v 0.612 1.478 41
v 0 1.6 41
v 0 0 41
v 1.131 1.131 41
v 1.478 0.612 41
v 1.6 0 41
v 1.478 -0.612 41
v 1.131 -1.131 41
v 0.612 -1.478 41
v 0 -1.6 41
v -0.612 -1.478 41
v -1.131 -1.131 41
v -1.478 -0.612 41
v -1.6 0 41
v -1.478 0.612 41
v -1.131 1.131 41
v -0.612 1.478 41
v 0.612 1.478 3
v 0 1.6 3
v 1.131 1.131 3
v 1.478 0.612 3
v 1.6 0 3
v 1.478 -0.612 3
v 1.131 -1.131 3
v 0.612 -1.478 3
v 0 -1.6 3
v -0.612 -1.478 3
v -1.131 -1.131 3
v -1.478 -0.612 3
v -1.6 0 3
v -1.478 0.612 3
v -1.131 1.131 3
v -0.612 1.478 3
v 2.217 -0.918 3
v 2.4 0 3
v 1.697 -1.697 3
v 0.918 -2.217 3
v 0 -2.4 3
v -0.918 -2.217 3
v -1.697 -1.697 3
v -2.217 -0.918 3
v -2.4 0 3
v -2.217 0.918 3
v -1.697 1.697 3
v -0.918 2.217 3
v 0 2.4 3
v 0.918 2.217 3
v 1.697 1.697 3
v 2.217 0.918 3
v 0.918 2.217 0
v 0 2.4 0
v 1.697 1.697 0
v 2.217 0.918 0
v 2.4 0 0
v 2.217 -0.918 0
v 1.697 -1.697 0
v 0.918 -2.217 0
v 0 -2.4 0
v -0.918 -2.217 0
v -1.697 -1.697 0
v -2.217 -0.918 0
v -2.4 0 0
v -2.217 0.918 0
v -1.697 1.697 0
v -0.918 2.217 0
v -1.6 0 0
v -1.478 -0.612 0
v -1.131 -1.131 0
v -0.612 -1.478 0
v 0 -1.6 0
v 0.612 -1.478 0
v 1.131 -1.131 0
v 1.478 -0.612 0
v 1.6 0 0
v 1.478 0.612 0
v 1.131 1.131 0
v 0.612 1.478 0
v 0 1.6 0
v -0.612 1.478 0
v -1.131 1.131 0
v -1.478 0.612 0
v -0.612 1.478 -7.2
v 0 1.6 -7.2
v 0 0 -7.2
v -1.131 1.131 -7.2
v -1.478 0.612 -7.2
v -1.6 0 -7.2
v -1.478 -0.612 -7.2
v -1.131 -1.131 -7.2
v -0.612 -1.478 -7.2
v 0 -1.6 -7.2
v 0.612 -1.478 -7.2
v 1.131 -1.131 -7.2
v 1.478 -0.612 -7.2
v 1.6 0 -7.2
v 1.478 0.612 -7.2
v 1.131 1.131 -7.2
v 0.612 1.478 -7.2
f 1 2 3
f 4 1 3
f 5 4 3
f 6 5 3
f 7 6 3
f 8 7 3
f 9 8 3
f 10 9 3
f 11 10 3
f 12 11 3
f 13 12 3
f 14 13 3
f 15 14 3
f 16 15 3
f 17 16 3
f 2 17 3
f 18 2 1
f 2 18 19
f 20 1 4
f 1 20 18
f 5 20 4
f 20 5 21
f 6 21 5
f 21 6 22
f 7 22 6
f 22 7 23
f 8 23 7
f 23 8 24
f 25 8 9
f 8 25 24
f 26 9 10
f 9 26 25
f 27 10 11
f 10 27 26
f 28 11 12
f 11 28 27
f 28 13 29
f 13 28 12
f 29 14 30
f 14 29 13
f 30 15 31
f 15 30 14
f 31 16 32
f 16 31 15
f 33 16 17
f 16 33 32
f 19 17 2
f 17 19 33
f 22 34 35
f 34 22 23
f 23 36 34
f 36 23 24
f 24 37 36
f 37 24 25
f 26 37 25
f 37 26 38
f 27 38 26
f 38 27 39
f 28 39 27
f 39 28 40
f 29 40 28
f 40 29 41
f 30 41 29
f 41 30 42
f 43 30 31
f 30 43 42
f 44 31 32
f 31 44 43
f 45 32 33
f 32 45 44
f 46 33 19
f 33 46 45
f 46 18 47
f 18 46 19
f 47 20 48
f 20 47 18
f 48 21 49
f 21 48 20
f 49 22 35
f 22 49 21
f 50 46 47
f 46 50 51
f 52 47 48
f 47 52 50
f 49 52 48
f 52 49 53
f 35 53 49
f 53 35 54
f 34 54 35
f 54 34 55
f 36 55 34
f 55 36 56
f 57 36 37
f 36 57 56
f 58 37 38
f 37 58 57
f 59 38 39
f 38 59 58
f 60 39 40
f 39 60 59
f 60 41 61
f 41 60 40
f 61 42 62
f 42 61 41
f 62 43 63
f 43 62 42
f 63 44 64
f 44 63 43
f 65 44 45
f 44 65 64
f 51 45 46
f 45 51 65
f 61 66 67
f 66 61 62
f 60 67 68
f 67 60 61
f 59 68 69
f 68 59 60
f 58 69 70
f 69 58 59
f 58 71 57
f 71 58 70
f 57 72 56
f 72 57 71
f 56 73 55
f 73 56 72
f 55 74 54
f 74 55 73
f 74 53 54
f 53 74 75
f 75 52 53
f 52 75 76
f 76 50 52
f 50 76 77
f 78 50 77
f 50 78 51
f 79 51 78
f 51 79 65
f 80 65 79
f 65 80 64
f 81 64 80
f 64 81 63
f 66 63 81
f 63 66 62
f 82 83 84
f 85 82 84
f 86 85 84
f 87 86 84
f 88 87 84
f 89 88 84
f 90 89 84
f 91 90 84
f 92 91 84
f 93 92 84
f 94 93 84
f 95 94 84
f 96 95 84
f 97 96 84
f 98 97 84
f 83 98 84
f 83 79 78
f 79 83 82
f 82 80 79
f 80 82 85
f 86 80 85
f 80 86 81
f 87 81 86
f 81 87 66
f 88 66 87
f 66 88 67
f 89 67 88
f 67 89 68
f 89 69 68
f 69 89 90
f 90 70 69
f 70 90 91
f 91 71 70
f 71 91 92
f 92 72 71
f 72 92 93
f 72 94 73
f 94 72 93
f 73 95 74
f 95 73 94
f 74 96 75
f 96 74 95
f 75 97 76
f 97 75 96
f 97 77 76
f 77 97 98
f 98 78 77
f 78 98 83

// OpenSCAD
// file: ../p/4-4disc.scad
use <../lib.scad>
function ldraw_lib__4_4disc() = [
// 0 Disc 1.0
// 0 Name: 4-4disc.dat
// 0 Author: James Jessiman
// 0 !LDRAW_ORG Primitive UPDATE 2002-02
// 0 !LICENSE Licensed under CC BY 4.0 : see CAreadme.txt
// 
// 0 BFC CERTIFY CCW
  [0,"BFC","CERTIFY"],
  [0,"BFC","CCW"],
// 
// 0 !HISTORY 1998-12-15 [PTadmin] Official Update 1998-10
// 0 !HISTORY 2002-03-23 [sbliss] Added BFC statement
// 0 !HISTORY 2002-04-25 [PTadmin] Official Update 2002-02
// 0 !HISTORY 2007-06-24 [PTadmin] Header formatted for Contributor Agreement
// 0 !HISTORY 2008-07-01 [PTadmin] Official Update 2008-01
// 
// 
// 3 16 0 0 0 1 0 0 0.9239 0 0.3827
  [3,16,0,0,0,1,0,0,0.9239,0,0.3827],
// 3 16 0 0 0 0.9239 0 0.3827 0.7071 0 0.7071
  [3,16,0,0,0,0.9239,0,0.3827,0.7071,0,0.7071],
// 3 16 0 0 0 0.7071 0 0.7071 0.3827 0 0.9239
  [3,16,0,0,0,0.7071,0,0.7071,0.3827,0,0.9239],
// 3 16 0 0 0 0.3827 0 0.9239 0 0 1
  [3,16,0,0,0,0.3827,0,0.9239,0,0,1],
// 3 16 0 0 0 0 0 1 -0.3827 0 0.9239
  [3,16,0,0,0,0,0,1,-0.3827,0,0.9239],
// 3 16 0 0 0 -0.3827 0 0.9239 -0.7071 0 0.7071
  [3,16,0,0,0,-0.3827,0,0.9239,-0.7071,0,0.7071],
// 3 16 0 0 0 -0.7071 0 0.7071 -0.9239 0 0.3827
  [3,16,0,0,0,-0.7071,0,0.7071,-0.9239,0,0.3827],
// 3 16 0 0 0 -0.9239 0 0.3827 -1 0 -0
  [3,16,0,0,0,-0.9239,0,0.3827,-1,0,-0],
// 3 16 0 0 0 -1 0 -0 -0.9239 0 -0.3827
  [3,16,0,0,0,-1,0,-0,-0.9239,0,-0.3827],
// 3 16 0 0 0 -0.9239 0 -0.3827 -0.7071 0 -0.7071
  [3,16,0,0,0,-0.9239,0,-0.3827,-0.7071,0,-0.7071],
// 3 16 0 0 0 -0.7071 0 -0.7071 -0.3827 0 -0.9239
  [3,16,0,0,0,-0.7071,0,-0.7071,-0.3827,0,-0.9239],
// 3 16 0 0 0 -0.3827 0 -0.9239 0 0 -1
  [3,16,0,0,0,-0.3827,0,-0.9239,0,0,-1],
// 3 16 0 0 0 0 0 -1 0.3827 0 -0.9239
  [3,16,0,0,0,0,0,-1,0.3827,0,-0.9239],
// 3 16 0 0 0 0.3827 0 -0.9239 0.7071 0 -0.7071
  [3,16,0,0,0,0.3827,0,-0.9239,0.7071,0,-0.7071],
// 3 16 0 0 0 0.7071 0 -0.7071 0.9239 0 -0.3827
  [3,16,0,0,0,0.7071,0,-0.7071,0.9239,0,-0.3827],
// 3 16 0 0 0 0.9239 0 -0.3827 1 0 0
  [3,16,0,0,0,0.9239,0,-0.3827,1,0,0],
// 0
];
module ldraw_lib__4_4disc(step=0, col=false, unit=2/5, alt=false, line=0.2, solid=!$preview)
    makepoly(ldraw_lib__4_4disc(), step=step, col=col, unit=unit, alt=alt, line=line, solid=solid);
ldraw_lib__4_4disc(line=0.2);
// file: ../p/4-4ring2.scad
use <../lib.scad>
function ldraw_lib__4_4ring2() = [
// 0 Ring  2 x 1.0
// 0 Name: 4-4ring2.dat
// 0 Author: James Jessiman
// 0 !LDRAW_ORG Primitive UPDATE 2009-01
// 0 !LICENSE Licensed under CC BY 4.0 : see CAreadme.txt
// 
// 0 BFC CERTIFY CCW
  [0,"BFC","CERTIFY"],
  [0,"BFC","CCW"],
// 
// 0 !HISTORY 1998-12-15 [PTadmin] Official Update 1998-10
// 0 !HISTORY 2002-04-05 [hafhead] Added BFC statement
// 0 !HISTORY 2002-04-25 [PTadmin] Official Update 2002-02
// 0 !HISTORY 2007-06-24 [PTadmin] Header formatted for Contributor Agreement
// 0 !HISTORY 2008-07-01 [PTadmin] Official Update 2008-01
// 0 !HISTORY 2008-08-26 [cwdee] Switch polygon winding and rename
// 0 !HISTORY 2009-05-02 [PTadmin] Official Update 2009-01
// 
// 
// 4 16 -1.1481 0 2.7717 -0.7654 0 1.8478 0 0 2 0 0 3
  [4,16,-1.1481,0,2.7717,-0.7654,0,1.8478,0,0,2,0,0,3],
// 4 16 -2.1213 0 2.1213 -1.4142 0 1.4142 -0.7654 0 1.8478 -1.1481 0 2.7717
  [4,16,-2.1213,0,2.1213,-1.4142,0,1.4142,-0.7654,0,1.8478,-1.1481,0,2.7717],
// 4 16 -2.7717 0 1.1481 -1.8478 0 0.7654 -1.4142 0 1.4142 -2.1213 0 2.1213
  [4,16,-2.7717,0,1.1481,-1.8478,0,0.7654,-1.4142,0,1.4142,-2.1213,0,2.1213],
// 4 16 -3 0 0 -2 0 0 -1.8478 0 0.7654 -2.7717 0 1.1481
  [4,16,-3,0,0,-2,0,0,-1.8478,0,0.7654,-2.7717,0,1.1481],
// 4 16 -2.7717 0 -1.1481 -1.8478 0 -0.7654 -2 0 0 -3 0 0
  [4,16,-2.7717,0,-1.1481,-1.8478,0,-0.7654,-2,0,0,-3,0,0],
// 4 16 -2.1213 0 -2.1213 -1.4142 0 -1.4142 -1.8478 0 -0.7654 -2.7717 0 -1.1481
  [4,16,-2.1213,0,-2.1213,-1.4142,0,-1.4142,-1.8478,0,-0.7654,-2.7717,0,-1.1481],
// 4 16 -1.1481 0 -2.7717 -0.7654 0 -1.8478 -1.4142 0 -1.4142 -2.1213 0 -2.1213
  [4,16,-1.1481,0,-2.7717,-0.7654,0,-1.8478,-1.4142,0,-1.4142,-2.1213,0,-2.1213],
// 4 16 0 0 -3 0 0 -2 -0.7654 0 -1.8478 -1.1481 0 -2.7717
  [4,16,0,0,-3,0,0,-2,-0.7654,0,-1.8478,-1.1481,0,-2.7717],
// 4 16 1.1481 0 -2.7717 0.7654 0 -1.8478 0 0 -2 0 0 -3
  [4,16,1.1481,0,-2.7717,0.7654,0,-1.8478,0,0,-2,0,0,-3],
// 4 16 2.1213 0 -2.1213 1.4142 0 -1.4142 0.7654 0 -1.8478 1.1481 0 -2.7717
  [4,16,2.1213,0,-2.1213,1.4142,0,-1.4142,0.7654,0,-1.8478,1.1481,0,-2.7717],
// 4 16 2.7717 0 -1.1481 1.8478 0 -0.7654 1.4142 0 -1.4142 2.1213 0 -2.1213
  [4,16,2.7717,0,-1.1481,1.8478,0,-0.7654,1.4142,0,-1.4142,2.1213,0,-2.1213],
// 4 16 3 0 0 2 0 0 1.8478 0 -0.7654 2.7717 0 -1.1481
  [4,16,3,0,0,2,0,0,1.8478,0,-0.7654,2.7717,0,-1.1481],
// 4 16 2.7717 0 1.1481 1.8478 0 0.7654 2 0 0 3 0 0
  [4,16,2.7717,0,1.1481,1.8478,0,0.7654,2,0,0,3,0,0],
// 4 16 2.1213 0 2.1213 1.4142 0 1.4142 1.8478 0 0.7654 2.7717 0 1.1481
  [4,16,2.1213,0,2.1213,1.4142,0,1.4142,1.8478,0,0.7654,2.7717,0,1.1481],
// 4 16 1.1481 0 2.7717 0.7654 0 1.8478 1.4142 0 1.4142 2.1213 0 2.1213
  [4,16,1.1481,0,2.7717,0.7654,0,1.8478,1.4142,0,1.4142,2.1213,0,2.1213],
// 4 16 0 0 3 0 0 2 0.7654 0 1.8478 1.1481 0 2.7717
  [4,16,0,0,3,0,0,2,0.7654,0,1.8478,1.1481,0,2.7717],
// 0
];
module ldraw_lib__4_4ring2(step=0, col=false, unit=2/5, alt=false, line=0.2, solid=!$preview)
    makepoly(ldraw_lib__4_4ring2(), step=step, col=col, unit=unit, alt=alt, line=line, solid=solid);
ldraw_lib__4_4ring2(line=0.2);
// file: ../p/4-4edge.scad
use <../lib.scad>
function ldraw_lib__4_4edge() = [
// 0 Circle 1.0
// 0 Name: 4-4edge.dat
// 0 Author: James Jessiman
// 0 !LDRAW_ORG Primitive UPDATE 2017-01
// 0 !LICENSE Licensed under CC BY 4.0 : see CAreadme.txt
// 
// 0 BFC CERTIFY CCW
  [0,"BFC","CERTIFY"],
  [0,"BFC","CCW"],
// 
// 0 !HISTORY 1998-12-15 [PTadmin] Official Update 1998-10
// 0 !HISTORY 2005-12-28 [PTadmin] Official Update 2005-01
// 0 !HISTORY 2007-06-24 [PTadmin] Header formatted for Contributor Agreement
// 0 !HISTORY 2008-07-01 [PTadmin] Official Update 2008-01
// 0 !HISTORY 2017-01-15 [Steffen] BFCed
// 0 !HISTORY 2017-12-30 [PTadmin] Official Update 2017-01
// 
// 
// 2 24 1 0 0 0.9239 0 0.3827
  [2,24,1,0,0,0.9239,0,0.3827],
// 2 24 0.9239 0 0.3827 0.7071 0 0.7071
  [2,24,0.9239,0,0.3827,0.7071,0,0.7071],
// 2 24 0.7071 0 0.7071 0.3827 0 0.9239
  [2,24,0.7071,0,0.7071,0.3827,0,0.9239],
// 2 24 0.3827 0 0.9239 0 0 1
  [2,24,0.3827,0,0.9239,0,0,1],
// 2 24 0 0 1 -0.3827 0 0.9239
  [2,24,0,0,1,-0.3827,0,0.9239],
// 2 24 -0.3827 0 0.9239 -0.7071 0 0.7071
  [2,24,-0.3827,0,0.9239,-0.7071,0,0.7071],
// 2 24 -0.7071 0 0.7071 -0.9239 0 0.3827
  [2,24,-0.7071,0,0.7071,-0.9239,0,0.3827],
// 2 24 -0.9239 0 0.3827 -1 0 -0
  [2,24,-0.9239,0,0.3827,-1,0,-0],
// 2 24 -1 0 -0 -0.9239 0 -0.3827
  [2,24,-1,0,-0,-0.9239,0,-0.3827],
// 2 24 -0.9239 0 -0.3827 -0.7071 0 -0.7071
  [2,24,-0.9239,0,-0.3827,-0.7071,0,-0.7071],
// 2 24 -0.7071 0 -0.7071 -0.3827 0 -0.9239
  [2,24,-0.7071,0,-0.7071,-0.3827,0,-0.9239],
// 2 24 -0.3827 0 -0.9239 0 0 -1
  [2,24,-0.3827,0,-0.9239,0,0,-1],
// 2 24 0 0 -1 0.3827 0 -0.9239
  [2,24,0,0,-1,0.3827,0,-0.9239],
// 2 24 0.3827 0 -0.9239 0.7071 0 -0.7071
  [2,24,0.3827,0,-0.9239,0.7071,0,-0.7071],
// 2 24 0.7071 0 -0.7071 0.9239 0 -0.3827
  [2,24,0.7071,0,-0.7071,0.9239,0,-0.3827],
// 2 24 0.9239 0 -0.3827 1 0 0
  [2,24,0.9239,0,-0.3827,1,0,0],
];
module ldraw_lib__4_4edge(step=0, col=false, unit=2/5, alt=false, line=0.2, solid=!$preview)
    makepoly(ldraw_lib__4_4edge(), step=step, col=col, unit=unit, alt=alt, line=line, solid=solid);
ldraw_lib__4_4edge(line=0.2);
// file: ../p/4-4cyli.scad
use <../lib.scad>
function ldraw_lib__4_4cyli() = [
// 0 Cylinder 1.0
// 0 Name: 4-4cyli.dat
// 0 Author: James Jessiman
// 0 !LDRAW_ORG Primitive UPDATE 2005-01
// 0 !LICENSE Licensed under CC BY 4.0 : see CAreadme.txt
// 
// 0 BFC CERTIFY CCW
  [0,"BFC","CERTIFY"],
  [0,"BFC","CCW"],
// 
// 0 !HISTORY 1998-12-15 [PTadmin] Official Update 1998-10
// 0 !HISTORY 2002-03-23 [sbliss] Added BFC statement; merged headers from files in distributions LDraw 0.27 and Complete.
// 0 !HISTORY 2002-04-25 [PTadmin] Official Update 2002-02
// 0 !HISTORY 2004-12-14 [guyvivan] BFC CCW
// 0 !HISTORY 2005-12-28 [PTadmin] Official Update 2005-01
// 0 !HISTORY 2007-06-24 [PTadmin] Header formatted for Contributor Agreement
// 0 !HISTORY 2008-07-01 [PTadmin] Official Update 2008-01
// 
// 
// 4 16 1 1 0 0.9239 1 0.3827 0.9239 0 0.3827 1 0 0
  [4,16,1,1,0,0.9239,1,0.3827,0.9239,0,0.3827,1,0,0],
// 5 24 1 0 0 1 1 0 0.9239 0 0.3827 0.9239 0 -0.3827
  [5,24,1,0,0,1,1,0,0.9239,0,0.3827,0.9239,0,-0.3827],
// 4 16 0.9239 1 0.3827 0.7071 1 0.7071 0.7071 0 0.7071 0.9239 0 0.3827
  [4,16,0.9239,1,0.3827,0.7071,1,0.7071,0.7071,0,0.7071,0.9239,0,0.3827],
// 5 24 0.9239 0 0.3827 0.9239 1 0.3827 0.7071 0 0.7071 1 0 0
  [5,24,0.9239,0,0.3827,0.9239,1,0.3827,0.7071,0,0.7071,1,0,0],
// 4 16 0.7071 1 0.7071 0.3827 1 0.9239 0.3827 0 0.9239 0.7071 0 0.7071
  [4,16,0.7071,1,0.7071,0.3827,1,0.9239,0.3827,0,0.9239,0.7071,0,0.7071],
// 5 24 0.7071 0 0.7071 0.7071 1 0.7071 0.3827 0 0.9239 0.9239 0 0.3827
  [5,24,0.7071,0,0.7071,0.7071,1,0.7071,0.3827,0,0.9239,0.9239,0,0.3827],
// 4 16 0.3827 1 0.9239 0 1 1 0 0 1 0.3827 0 0.9239
  [4,16,0.3827,1,0.9239,0,1,1,0,0,1,0.3827,0,0.9239],
// 5 24 0.3827 0 0.9239 0.3827 1 0.9239 0 0 1 0.7071 0 0.7071
  [5,24,0.3827,0,0.9239,0.3827,1,0.9239,0,0,1,0.7071,0,0.7071],
// 4 16 0 1 1 -0.3827 1 0.9239 -0.3827 0 0.9239 0 0 1
  [4,16,0,1,1,-0.3827,1,0.9239,-0.3827,0,0.9239,0,0,1],
// 5 24 0 0 1 0 1 1 -0.3827 0 0.9239 0.3827 0 0.9239
  [5,24,0,0,1,0,1,1,-0.3827,0,0.9239,0.3827,0,0.9239],
// 4 16 -0.3827 1 0.9239 -0.7071 1 0.7071 -0.7071 0 0.7071 -0.3827 0 0.9239
  [4,16,-0.3827,1,0.9239,-0.7071,1,0.7071,-0.7071,0,0.7071,-0.3827,0,0.9239],
// 5 24 -0.3827 0 0.9239 -0.3827 1 0.9239 -0.7071 0 0.7071 0 0 1
  [5,24,-0.3827,0,0.9239,-0.3827,1,0.9239,-0.7071,0,0.7071,0,0,1],
// 4 16 -0.7071 1 0.7071 -0.9239 1 0.3827 -0.9239 0 0.3827 -0.7071 0 0.7071
  [4,16,-0.7071,1,0.7071,-0.9239,1,0.3827,-0.9239,0,0.3827,-0.7071,0,0.7071],
// 5 24 -0.7071 0 0.7071 -0.7071 1 0.7071 -0.9239 0 0.3827 -0.3827 0 0.9239
  [5,24,-0.7071,0,0.7071,-0.7071,1,0.7071,-0.9239,0,0.3827,-0.3827,0,0.9239],
// 4 16 -0.9239 1 0.3827 -1 1 0 -1 0 0 -0.9239 0 0.3827
  [4,16,-0.9239,1,0.3827,-1,1,0,-1,0,0,-0.9239,0,0.3827],
// 5 24 -0.9239 0 0.3827 -0.9239 1 0.3827 -1 0 0 -0.7071 0 0.7071
  [5,24,-0.9239,0,0.3827,-0.9239,1,0.3827,-1,0,0,-0.7071,0,0.7071],
// 4 16 -1 1 0 -0.9239 1 -0.3827 -0.9239 0 -0.3827 -1 0 0
  [4,16,-1,1,0,-0.9239,1,-0.3827,-0.9239,0,-0.3827,-1,0,0],
// 5 24 -1 0 0 -1 1 0 -0.9239 0 -0.3827 -0.9239 0 0.3827
  [5,24,-1,0,0,-1,1,0,-0.9239,0,-0.3827,-0.9239,0,0.3827],
// 4 16 -0.9239 1 -0.3827 -0.7071 1 -0.7071 -0.7071 0 -0.7071 -0.9239 0 -0.3827
  [4,16,-0.9239,1,-0.3827,-0.7071,1,-0.7071,-0.7071,0,-0.7071,-0.9239,0,-0.3827],
// 5 24 -0.9239 0 -0.3827 -0.9239 1 -0.3827 -0.7071 0 -0.7071 -1 0 0
  [5,24,-0.9239,0,-0.3827,-0.9239,1,-0.3827,-0.7071,0,-0.7071,-1,0,0],
// 4 16 -0.7071 1 -0.7071 -0.3827 1 -0.9239 -0.3827 0 -0.9239 -0.7071 0 -0.7071
  [4,16,-0.7071,1,-0.7071,-0.3827,1,-0.9239,-0.3827,0,-0.9239,-0.7071,0,-0.7071],
// 5 24 -0.7071 0 -0.7071 -0.7071 1 -0.7071 -0.3827 0 -0.9239 -0.9239 0 -0.3827
  [5,24,-0.7071,0,-0.7071,-0.7071,1,-0.7071,-0.3827,0,-0.9239,-0.9239,0,-0.3827],
// 4 16 -0.3827 1 -0.9239 0 1 -1 0 0 -1 -0.3827 0 -0.9239
  [4,16,-0.3827,1,-0.9239,0,1,-1,0,0,-1,-0.3827,0,-0.9239],
// 5 24 -0.3827 0 -0.9239 -0.3827 1 -0.9239 0 0 -1 -0.7071 0 -0.7071
  [5,24,-0.3827,0,-0.9239,-0.3827,1,-0.9239,0,0,-1,-0.7071,0,-0.7071],
// 4 16 0 1 -1 0.3827 1 -0.9239 0.3827 0 -0.9239 0 0 -1
  [4,16,0,1,-1,0.3827,1,-0.9239,0.3827,0,-0.9239,0,0,-1],
// 5 24 0 0 -1 0 1 -1 0.3827 0 -0.9239 -0.3827 0 -0.9239
  [5,24,0,0,-1,0,1,-1,0.3827,0,-0.9239,-0.3827,0,-0.9239],
// 4 16 0.3827 1 -0.9239 0.7071 1 -0.7071 0.7071 0 -0.7071 0.3827 0 -0.9239
  [4,16,0.3827,1,-0.9239,0.7071,1,-0.7071,0.7071,0,-0.7071,0.3827,0,-0.9239],
// 5 24 0.3827 0 -0.9239 0.3827 1 -0.9239 0.7071 0 -0.7071 0 0 -1
  [5,24,0.3827,0,-0.9239,0.3827,1,-0.9239,0.7071,0,-0.7071,0,0,-1],
// 4 16 0.7071 1 -0.7071 0.9239 1 -0.3827 0.9239 0 -0.3827 0.7071 0 -0.7071
  [4,16,0.7071,1,-0.7071,0.9239,1,-0.3827,0.9239,0,-0.3827,0.7071,0,-0.7071],
// 5 24 0.7071 0 -0.7071 0.7071 1 -0.7071 0.9239 0 -0.3827 0.3827 0 -0.9239
  [5,24,0.7071,0,-0.7071,0.7071,1,-0.7071,0.9239,0,-0.3827,0.3827,0,-0.9239],
// 4 16 0.9239 1 -0.3827 1 1 0 1 0 0 0.9239 0 -0.3827
  [4,16,0.9239,1,-0.3827,1,1,0,1,0,0,0.9239,0,-0.3827],
// 5 24 0.9239 0 -0.3827 0.9239 1 -0.3827 1 0 0 0.7071 0 -0.7071
  [5,24,0.9239,0,-0.3827,0.9239,1,-0.3827,1,0,0,0.7071,0,-0.7071],
// 0
];
module ldraw_lib__4_4cyli(step=0, col=false, unit=2/5, alt=false, line=0.2, solid=!$preview)
    makepoly(ldraw_lib__4_4cyli(), step=step, col=col, unit=unit, alt=alt, line=line, solid=solid);
ldraw_lib__4_4cyli(line=0.2);
// file: ../p/4-4cylc.scad
use <../lib.scad>
use <4-4cyli.scad>
use <4-4disc.scad>
use <4-4edge.scad>
function ldraw_lib__4_4cylc() = [
// 0 Cylinder Closed 1.0
// 0 Name: 4-4cylc.dat
// 0 Author: Alex Taylor [anathema]
// 0 !LDRAW_ORG Primitive UPDATE 2009-02
// 0 !LICENSE Licensed under CC BY 4.0 : see CAreadme.txt
// 
// 0 BFC CERTIFY CCW
  [0,"BFC","CERTIFY"],
  [0,"BFC","CCW"],
// 
// 0 !HISTORY 2008-12-29 [cwdee] Removed one disc
// 0 !HISTORY 2009-09-03 [PTadmin] Official Update 2009-02
// 
// 
// 1 16 0 0 0 1 0 0 0 1 0 0 0 1 4-4edge.dat
  [1,16,0,0,0,1,0,0,0,1,0,0,0,1, ldraw_lib__4_4edge()],
// 1 16 0 1 0 1 0 0 0 1 0 0 0 1 4-4edge.dat
  [1,16,0,1,0,1,0,0,0,1,0,0,0,1, ldraw_lib__4_4edge()],
// 1 16 0 0 0 1 0 0 0 1 0 0 0 1 4-4disc.dat
  [1,16,0,0,0,1,0,0,0,1,0,0,0,1, ldraw_lib__4_4disc()],
// 1 16 0 0 0 1 0 0 0 1 0 0 0 1 4-4cyli.dat
  [1,16,0,0,0,1,0,0,0,1,0,0,0,1, ldraw_lib__4_4cyli()],
// 0
];
module ldraw_lib__4_4cylc(step=0, col=false, unit=2/5, alt=false, line=0.2, solid=!$preview)
    makepoly(ldraw_lib__4_4cylc(), step=step, col=col, unit=unit, alt=alt, line=line, solid=solid);
ldraw_lib__4_4cylc(line=0.2);
// main file
use <../lib.scad>
use <../p/4-4cylc.scad>
use <../p/4-4cyli.scad>
use <../p/4-4edge.scad>
use <../p/4-4ring2.scad>
function ldraw_lib__63965() = [
// 0 ~Bar  6L with Thick Stop (Obsolete)
// 0 Name: 63965.dat
// 0 Author: El'dar Ismagilov [Eldar]
// 0 !LDRAW_ORG Part UPDATE 2020-01
// 0 !LICENSE Licensed under CC BY 2.0 and CC BY 4.0 : see CAreadme.txt
// 
// 0 BFC CERTIFY CW
  [0,"BFC","CERTIFY"],
  [0,"BFC","CW"],
// 
// 0 !CATEGORY Obsolete
// 0 !KEYWORDS Missile, pole, rod, Small, stand, Star Wars, town, umbrella
// 
// 0 !HISTORY 2009-09-03 [PTadmin] Official Update 2009-02
// 0 !HISTORY 2020-04-19 [PTadmin] Corrected geometry in 63965a
// 0 !HISTORY 2020-06-28 [PTadmin] Official Update 2020-01
// 
// 
// 1 16 0 -102.5 0 0 0 4 0 95 0 4 0 0 4-4cylc.dat
  [1,16,0,-102.5,0,0,0,4,0,95,0,4,0,0, ldraw_lib__4_4cylc()],
// 1 16 0 -7.5 0 0 0 6 0 1 0 6 0 0 4-4edge.dat
  [1,16,0,-7.5,0,0,0,6,0,1,0,6,0,0, ldraw_lib__4_4edge()],
// 1 16 0 -7.5 0 0 0 2 0 2 0 2 0 0 4-4ring2.dat
  [1,16,0,-7.5,0,0,0,2,0,2,0,2,0,0, ldraw_lib__4_4ring2()],
// 1 16 0 -7.5 0 0 0 6 0 7.5 0 6 0 0 4-4cyli.dat
  [1,16,0,-7.5,0,0,0,6,0,7.5,0,6,0,0, ldraw_lib__4_4cyli()],
// 1 16 0 0 0 0 0 6 0 1 0 6 0 0 4-4edge.dat
  [1,16,0,0,0,0,0,6,0,1,0,6,0,0, ldraw_lib__4_4edge()],
// 1 16 0 0 0 0 0 -2 0 -2 0 2 0 0 4-4ring2.dat
  [1,16,0,0,0,0,0,-2,0,-2,0,2,0,0, ldraw_lib__4_4ring2()],
// 1 16 0 18 0 0 0 -4 0 -18 0 4 0 0 4-4cylc.dat
  [1,16,0,18,0,0,0,-4,0,-18,0,4,0,0, ldraw_lib__4_4cylc()],
// 0
];
module ldraw_lib__63965(step=0, col=false, unit=2/5, alt=false, line=0.2, solid=!$preview)
    makepoly(ldraw_lib__63965(), step=step, col=col, unit=unit, alt=alt, line=line, solid=solid);
ldraw_lib__63965(line=0.2);
